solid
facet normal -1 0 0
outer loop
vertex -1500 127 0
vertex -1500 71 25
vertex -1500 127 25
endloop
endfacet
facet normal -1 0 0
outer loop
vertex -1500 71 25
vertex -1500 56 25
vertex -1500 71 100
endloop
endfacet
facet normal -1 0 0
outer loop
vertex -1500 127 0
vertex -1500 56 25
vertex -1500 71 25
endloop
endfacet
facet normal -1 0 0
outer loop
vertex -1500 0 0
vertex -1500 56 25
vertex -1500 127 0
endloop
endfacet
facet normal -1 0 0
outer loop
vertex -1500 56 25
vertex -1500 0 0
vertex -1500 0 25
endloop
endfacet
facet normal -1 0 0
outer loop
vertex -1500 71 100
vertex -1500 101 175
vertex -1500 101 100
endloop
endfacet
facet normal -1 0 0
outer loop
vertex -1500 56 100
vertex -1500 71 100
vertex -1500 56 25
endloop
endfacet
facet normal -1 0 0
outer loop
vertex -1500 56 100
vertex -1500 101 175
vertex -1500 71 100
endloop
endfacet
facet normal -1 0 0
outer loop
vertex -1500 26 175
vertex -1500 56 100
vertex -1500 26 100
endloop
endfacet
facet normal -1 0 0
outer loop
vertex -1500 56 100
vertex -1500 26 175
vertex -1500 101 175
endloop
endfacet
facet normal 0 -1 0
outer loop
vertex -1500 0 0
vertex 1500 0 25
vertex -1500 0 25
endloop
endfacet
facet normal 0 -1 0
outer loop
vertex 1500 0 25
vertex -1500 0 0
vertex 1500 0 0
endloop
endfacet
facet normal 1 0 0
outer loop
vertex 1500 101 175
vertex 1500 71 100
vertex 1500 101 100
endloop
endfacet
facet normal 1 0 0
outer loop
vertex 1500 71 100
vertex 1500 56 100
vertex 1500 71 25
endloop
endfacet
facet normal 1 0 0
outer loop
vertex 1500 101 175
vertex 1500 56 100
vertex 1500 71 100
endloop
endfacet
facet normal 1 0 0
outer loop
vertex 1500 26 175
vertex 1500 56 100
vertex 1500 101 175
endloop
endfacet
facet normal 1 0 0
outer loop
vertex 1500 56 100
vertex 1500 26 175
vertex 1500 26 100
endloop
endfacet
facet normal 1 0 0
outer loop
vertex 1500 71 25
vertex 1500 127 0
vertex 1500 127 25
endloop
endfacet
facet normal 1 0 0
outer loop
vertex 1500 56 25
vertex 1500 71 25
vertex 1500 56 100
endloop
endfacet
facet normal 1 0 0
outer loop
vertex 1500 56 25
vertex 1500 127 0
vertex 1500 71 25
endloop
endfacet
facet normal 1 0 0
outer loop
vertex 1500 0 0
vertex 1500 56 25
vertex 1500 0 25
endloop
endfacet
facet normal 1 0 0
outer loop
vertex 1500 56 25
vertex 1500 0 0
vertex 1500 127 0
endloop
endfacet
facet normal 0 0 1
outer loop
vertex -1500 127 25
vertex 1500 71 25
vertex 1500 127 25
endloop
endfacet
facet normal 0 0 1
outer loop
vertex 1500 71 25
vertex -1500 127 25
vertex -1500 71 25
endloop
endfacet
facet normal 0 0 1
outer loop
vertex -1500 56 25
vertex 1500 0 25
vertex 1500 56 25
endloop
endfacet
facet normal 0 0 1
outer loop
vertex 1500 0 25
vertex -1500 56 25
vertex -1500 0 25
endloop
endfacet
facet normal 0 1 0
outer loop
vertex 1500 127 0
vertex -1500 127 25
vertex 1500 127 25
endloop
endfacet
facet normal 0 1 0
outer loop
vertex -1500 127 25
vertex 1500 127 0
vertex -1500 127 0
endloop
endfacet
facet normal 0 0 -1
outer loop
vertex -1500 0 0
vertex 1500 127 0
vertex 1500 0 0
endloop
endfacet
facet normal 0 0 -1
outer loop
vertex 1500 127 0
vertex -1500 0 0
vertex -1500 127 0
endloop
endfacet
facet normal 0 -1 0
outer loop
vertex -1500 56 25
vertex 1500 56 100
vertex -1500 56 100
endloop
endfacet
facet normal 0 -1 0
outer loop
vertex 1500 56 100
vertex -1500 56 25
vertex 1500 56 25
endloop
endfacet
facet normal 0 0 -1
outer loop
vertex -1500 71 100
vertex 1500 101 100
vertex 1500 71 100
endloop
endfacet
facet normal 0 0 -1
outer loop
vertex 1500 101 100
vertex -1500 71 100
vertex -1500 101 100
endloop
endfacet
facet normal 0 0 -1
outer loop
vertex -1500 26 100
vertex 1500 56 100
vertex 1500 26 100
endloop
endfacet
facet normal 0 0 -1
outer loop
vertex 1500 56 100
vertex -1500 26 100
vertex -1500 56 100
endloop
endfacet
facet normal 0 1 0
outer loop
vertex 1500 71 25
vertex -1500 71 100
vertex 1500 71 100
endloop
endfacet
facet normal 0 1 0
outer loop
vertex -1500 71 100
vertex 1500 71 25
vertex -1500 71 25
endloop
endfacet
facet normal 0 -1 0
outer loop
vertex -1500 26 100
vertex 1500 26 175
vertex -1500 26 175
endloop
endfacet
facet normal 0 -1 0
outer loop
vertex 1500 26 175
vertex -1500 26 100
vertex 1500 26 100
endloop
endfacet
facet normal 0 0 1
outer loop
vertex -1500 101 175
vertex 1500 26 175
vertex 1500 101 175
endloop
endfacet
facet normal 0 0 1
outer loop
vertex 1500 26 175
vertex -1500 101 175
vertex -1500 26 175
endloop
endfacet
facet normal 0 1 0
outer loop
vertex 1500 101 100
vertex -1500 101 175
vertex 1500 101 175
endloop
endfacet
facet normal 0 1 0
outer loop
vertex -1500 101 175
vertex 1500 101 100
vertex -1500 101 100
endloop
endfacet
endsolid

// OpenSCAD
base_width = 127;
base_height = 25;

head_height = 75;
head_width  = 75;

rail_height = 75;
rail_width  = 15;

//rail base
rotate([90,0,90])
linear_extrude(height = 3000, center = true)
square([base_width,base_height])
;

//rail "rail"
rotate([90,0,90])
linear_extrude(height = 3000, center = true)
translate([base_width/2-rail_width/2,base_height,0])
square([rail_width, rail_height])
;

//rail head
rotate([90,0,90])
linear_extrude(height = 3000, center = true)
translate([base_width/2-head_width/2,base_height+rail_height,0])
square([head_width, head_height])
;
